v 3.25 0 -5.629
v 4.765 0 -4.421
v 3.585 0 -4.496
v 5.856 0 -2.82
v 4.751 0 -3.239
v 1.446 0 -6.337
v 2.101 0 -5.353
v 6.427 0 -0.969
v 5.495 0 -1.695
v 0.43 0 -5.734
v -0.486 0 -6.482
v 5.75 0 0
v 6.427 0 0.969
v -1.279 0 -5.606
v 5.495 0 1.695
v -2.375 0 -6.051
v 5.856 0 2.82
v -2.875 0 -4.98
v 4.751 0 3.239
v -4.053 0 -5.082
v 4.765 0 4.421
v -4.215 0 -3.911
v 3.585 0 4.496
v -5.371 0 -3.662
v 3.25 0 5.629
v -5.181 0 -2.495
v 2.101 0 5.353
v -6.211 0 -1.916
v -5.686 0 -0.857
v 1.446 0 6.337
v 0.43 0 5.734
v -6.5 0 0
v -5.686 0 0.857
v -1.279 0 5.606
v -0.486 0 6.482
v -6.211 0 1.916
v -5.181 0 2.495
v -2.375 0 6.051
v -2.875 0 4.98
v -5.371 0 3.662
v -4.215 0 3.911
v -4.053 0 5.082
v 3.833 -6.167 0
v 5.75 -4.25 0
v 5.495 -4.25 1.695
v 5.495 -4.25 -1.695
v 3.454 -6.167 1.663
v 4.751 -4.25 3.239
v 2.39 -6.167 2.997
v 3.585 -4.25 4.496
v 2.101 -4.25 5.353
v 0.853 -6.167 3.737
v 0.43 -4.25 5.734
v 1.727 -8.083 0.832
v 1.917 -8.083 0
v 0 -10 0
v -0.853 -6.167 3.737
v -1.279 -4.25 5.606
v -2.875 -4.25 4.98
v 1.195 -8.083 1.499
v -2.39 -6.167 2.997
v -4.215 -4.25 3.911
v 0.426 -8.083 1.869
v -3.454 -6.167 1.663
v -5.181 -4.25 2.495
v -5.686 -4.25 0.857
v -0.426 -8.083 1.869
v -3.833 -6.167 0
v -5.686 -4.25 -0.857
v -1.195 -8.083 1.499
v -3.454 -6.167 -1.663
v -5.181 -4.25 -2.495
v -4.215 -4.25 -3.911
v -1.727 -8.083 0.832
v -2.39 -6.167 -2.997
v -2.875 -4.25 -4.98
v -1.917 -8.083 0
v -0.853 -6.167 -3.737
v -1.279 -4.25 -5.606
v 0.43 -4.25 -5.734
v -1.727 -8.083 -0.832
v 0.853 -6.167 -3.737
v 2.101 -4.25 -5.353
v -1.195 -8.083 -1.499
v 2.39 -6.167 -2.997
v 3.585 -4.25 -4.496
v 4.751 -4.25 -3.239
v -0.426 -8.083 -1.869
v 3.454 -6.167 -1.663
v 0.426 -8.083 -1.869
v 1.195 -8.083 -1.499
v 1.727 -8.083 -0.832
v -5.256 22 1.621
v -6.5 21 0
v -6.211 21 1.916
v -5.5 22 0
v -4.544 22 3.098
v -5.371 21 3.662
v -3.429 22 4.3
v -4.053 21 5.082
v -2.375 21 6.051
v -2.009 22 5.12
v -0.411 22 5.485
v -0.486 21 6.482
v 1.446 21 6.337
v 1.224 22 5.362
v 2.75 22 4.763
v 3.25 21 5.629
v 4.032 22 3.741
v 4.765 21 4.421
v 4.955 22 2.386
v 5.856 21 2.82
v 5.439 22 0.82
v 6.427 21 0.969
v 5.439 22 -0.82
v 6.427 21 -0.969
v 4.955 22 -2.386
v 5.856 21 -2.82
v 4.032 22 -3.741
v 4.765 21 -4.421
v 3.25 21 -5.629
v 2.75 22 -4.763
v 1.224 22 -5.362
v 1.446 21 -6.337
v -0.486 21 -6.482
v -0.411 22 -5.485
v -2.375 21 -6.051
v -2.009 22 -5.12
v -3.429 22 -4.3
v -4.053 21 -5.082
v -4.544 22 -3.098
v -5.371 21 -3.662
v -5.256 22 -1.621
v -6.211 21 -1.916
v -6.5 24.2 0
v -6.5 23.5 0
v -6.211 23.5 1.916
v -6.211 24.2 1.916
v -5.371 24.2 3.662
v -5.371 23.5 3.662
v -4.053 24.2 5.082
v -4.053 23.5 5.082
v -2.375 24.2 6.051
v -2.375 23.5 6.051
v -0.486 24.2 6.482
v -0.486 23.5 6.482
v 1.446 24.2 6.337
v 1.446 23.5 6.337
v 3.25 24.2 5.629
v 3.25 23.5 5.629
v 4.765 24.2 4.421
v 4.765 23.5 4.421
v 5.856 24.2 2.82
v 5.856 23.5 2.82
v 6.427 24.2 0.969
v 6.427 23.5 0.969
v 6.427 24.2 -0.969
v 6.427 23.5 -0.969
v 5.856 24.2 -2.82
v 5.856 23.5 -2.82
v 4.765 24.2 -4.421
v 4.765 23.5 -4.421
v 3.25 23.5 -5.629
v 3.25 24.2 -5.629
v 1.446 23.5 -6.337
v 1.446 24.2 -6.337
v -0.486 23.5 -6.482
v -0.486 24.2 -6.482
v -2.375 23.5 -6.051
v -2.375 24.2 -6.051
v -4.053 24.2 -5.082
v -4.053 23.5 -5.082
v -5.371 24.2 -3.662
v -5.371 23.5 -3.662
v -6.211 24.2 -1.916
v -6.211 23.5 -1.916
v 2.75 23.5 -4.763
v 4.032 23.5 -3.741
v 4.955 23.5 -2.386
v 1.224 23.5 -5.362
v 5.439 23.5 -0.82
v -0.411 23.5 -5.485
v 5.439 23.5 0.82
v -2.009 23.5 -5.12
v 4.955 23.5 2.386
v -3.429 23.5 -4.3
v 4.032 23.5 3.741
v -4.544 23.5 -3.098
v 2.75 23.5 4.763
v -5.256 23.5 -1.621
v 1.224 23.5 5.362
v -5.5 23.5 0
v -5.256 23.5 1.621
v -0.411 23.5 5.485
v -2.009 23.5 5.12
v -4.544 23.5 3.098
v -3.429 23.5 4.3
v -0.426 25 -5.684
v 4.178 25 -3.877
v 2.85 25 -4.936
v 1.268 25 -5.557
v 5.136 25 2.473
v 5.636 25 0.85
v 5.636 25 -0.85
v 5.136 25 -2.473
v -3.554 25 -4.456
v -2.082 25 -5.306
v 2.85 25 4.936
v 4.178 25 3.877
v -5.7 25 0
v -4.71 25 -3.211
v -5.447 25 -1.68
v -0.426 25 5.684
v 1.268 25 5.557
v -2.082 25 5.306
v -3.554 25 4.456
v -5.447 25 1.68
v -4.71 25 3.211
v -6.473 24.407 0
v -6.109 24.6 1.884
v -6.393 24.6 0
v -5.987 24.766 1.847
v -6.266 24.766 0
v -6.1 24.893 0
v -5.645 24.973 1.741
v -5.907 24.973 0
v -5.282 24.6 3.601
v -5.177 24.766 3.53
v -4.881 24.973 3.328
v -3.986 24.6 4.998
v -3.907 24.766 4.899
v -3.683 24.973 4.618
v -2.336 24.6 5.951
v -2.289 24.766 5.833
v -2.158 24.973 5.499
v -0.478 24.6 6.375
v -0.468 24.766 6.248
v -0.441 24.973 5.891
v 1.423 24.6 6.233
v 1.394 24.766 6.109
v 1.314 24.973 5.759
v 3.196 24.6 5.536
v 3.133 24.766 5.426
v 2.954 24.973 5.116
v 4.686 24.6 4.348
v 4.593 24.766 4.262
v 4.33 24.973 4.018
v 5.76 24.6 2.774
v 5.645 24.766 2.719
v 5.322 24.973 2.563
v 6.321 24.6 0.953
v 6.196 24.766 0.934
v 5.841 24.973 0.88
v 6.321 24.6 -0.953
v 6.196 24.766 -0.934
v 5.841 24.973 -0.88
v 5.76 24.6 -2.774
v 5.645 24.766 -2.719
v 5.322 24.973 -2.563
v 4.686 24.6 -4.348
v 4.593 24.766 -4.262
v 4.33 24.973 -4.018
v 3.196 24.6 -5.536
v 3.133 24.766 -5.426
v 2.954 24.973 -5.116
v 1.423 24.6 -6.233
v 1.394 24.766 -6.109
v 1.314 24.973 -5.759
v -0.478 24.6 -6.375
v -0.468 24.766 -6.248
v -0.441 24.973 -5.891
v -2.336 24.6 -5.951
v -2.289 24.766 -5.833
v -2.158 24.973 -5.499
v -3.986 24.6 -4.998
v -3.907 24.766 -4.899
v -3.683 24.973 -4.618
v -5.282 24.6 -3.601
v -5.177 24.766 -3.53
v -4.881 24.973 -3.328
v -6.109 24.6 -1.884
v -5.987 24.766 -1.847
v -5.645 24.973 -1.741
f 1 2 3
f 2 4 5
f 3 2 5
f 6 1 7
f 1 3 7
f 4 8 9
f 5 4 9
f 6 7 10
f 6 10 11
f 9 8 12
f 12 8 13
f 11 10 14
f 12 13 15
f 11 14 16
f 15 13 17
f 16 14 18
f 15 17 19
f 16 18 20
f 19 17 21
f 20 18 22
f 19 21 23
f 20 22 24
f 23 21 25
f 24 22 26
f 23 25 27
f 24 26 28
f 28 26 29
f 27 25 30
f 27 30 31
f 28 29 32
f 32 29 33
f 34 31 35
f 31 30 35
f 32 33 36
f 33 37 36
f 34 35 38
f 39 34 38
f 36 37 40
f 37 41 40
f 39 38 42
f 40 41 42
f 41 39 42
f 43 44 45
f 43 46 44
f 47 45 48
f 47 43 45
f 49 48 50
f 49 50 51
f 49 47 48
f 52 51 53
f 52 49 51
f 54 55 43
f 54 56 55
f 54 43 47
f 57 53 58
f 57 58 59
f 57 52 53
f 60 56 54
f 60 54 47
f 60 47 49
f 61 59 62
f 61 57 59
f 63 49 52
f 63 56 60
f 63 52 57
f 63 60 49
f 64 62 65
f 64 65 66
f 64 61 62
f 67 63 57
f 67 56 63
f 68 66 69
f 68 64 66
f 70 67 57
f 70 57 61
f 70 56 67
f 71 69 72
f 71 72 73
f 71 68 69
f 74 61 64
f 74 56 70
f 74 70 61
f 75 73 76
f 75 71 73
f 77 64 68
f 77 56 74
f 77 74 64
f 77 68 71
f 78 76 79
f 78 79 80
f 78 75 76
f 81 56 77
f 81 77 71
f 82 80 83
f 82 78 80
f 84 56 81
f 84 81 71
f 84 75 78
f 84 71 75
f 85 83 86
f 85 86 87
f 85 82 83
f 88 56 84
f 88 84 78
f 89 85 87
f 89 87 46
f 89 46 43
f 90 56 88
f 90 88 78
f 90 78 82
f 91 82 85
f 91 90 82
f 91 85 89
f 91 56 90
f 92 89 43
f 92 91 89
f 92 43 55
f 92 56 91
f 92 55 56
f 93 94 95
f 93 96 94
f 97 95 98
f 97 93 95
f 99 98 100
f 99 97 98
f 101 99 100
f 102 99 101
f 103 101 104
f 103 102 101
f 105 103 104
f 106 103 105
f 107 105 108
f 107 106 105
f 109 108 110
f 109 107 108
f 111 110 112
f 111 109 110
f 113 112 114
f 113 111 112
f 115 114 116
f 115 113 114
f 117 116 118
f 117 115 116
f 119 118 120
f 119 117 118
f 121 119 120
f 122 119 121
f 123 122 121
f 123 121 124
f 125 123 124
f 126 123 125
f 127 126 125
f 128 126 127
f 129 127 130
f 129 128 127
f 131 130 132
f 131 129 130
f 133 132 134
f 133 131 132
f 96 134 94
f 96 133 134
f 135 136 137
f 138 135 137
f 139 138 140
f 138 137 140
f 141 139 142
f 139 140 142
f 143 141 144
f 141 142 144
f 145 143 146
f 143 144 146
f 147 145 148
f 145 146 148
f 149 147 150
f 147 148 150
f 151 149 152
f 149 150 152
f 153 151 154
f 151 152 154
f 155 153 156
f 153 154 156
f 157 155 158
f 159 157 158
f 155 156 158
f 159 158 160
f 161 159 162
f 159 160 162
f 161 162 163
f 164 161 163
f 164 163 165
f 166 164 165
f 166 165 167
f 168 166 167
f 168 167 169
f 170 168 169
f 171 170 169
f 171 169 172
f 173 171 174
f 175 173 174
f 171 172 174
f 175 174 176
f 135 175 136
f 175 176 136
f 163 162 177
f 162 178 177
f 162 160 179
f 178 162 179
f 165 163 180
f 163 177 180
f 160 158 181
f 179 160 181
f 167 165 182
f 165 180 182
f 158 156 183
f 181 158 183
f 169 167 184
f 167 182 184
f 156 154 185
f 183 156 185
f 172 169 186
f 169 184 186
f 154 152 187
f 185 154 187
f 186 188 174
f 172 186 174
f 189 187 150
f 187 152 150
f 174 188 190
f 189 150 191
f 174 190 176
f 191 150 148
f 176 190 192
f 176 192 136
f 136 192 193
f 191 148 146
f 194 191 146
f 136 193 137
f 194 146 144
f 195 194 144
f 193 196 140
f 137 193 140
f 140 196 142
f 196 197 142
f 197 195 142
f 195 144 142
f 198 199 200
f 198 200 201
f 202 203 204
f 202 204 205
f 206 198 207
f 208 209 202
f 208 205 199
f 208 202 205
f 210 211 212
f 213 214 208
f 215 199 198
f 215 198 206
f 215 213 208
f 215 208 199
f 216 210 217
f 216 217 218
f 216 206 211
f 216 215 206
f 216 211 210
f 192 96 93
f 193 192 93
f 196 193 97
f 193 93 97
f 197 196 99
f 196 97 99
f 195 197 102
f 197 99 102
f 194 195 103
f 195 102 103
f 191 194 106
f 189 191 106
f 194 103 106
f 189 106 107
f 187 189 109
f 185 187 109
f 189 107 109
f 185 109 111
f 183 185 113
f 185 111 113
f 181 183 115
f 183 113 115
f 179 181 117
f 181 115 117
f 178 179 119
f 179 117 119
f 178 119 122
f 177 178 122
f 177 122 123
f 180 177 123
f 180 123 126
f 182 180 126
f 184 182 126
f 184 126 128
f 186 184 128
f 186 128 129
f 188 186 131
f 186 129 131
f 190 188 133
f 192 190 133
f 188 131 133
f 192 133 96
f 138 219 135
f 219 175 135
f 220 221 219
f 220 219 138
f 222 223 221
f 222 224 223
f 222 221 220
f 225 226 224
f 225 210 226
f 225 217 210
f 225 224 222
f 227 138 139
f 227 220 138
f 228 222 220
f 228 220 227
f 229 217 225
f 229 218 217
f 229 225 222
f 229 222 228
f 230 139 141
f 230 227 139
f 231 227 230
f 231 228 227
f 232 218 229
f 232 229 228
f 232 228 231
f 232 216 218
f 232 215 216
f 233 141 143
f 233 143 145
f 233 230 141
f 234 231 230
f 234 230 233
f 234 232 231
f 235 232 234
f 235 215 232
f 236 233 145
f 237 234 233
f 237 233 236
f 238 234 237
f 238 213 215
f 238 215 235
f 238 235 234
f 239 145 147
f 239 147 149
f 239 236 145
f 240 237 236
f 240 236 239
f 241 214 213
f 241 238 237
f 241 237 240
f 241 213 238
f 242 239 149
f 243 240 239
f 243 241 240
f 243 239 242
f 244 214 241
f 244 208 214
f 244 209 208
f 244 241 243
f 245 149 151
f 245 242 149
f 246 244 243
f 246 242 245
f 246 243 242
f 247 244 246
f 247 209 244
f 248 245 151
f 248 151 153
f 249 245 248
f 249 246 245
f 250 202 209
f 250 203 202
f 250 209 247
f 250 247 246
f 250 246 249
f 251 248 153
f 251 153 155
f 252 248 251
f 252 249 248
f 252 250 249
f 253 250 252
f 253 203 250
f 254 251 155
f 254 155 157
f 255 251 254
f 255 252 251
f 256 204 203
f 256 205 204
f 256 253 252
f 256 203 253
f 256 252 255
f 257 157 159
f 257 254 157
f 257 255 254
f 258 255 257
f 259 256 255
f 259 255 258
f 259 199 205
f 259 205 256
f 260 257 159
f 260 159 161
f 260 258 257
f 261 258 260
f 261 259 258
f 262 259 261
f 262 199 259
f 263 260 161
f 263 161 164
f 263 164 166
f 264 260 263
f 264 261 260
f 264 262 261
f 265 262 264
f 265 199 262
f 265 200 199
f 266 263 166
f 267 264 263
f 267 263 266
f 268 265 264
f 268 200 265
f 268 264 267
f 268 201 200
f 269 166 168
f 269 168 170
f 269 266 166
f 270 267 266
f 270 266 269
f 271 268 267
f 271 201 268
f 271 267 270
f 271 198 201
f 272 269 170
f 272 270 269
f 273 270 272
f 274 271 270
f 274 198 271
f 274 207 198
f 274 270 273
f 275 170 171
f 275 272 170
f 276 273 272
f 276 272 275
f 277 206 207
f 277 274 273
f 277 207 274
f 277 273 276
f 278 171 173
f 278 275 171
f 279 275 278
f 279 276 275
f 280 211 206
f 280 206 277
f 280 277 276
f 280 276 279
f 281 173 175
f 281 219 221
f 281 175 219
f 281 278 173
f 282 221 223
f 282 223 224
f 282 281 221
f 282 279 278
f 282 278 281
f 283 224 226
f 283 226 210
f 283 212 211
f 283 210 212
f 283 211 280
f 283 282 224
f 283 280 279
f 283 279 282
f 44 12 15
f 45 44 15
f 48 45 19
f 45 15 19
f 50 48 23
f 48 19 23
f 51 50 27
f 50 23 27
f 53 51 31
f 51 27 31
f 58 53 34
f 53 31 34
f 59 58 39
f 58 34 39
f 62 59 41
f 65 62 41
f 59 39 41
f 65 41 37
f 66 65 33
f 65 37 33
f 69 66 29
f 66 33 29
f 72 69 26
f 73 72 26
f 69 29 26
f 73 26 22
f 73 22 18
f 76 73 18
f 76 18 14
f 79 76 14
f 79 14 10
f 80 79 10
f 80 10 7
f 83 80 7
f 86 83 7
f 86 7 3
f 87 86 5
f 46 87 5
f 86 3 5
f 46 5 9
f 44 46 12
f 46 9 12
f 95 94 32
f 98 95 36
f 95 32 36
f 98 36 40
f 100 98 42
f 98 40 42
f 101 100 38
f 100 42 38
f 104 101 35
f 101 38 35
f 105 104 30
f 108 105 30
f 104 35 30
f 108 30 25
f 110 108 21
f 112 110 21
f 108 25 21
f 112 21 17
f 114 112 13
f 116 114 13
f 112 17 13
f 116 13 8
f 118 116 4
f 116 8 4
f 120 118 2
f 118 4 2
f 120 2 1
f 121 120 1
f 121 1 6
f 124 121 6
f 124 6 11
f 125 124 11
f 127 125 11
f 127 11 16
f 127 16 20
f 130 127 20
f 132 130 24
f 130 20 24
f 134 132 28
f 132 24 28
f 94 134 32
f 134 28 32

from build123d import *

# Parameters (mm, degrees)
F0_R     = 5.75
F1_DEPTH = 10
F2_SIZE  = 5.75
F3_R     = 6.5
F4_DEPTH = 22
F5_SIZE  = 1
F6_R     = 5.5
F7_DEPTH = 1.5
F8_R     = 6.5
F9_DEPTH = 1.5
F10_R    = 0.8


with BuildPart() as f1:
    # F0 (on Front) → F1 (new body)
    with BuildSketch(Plane.XZ):
        Circle(F0_R)
    extrude(amount=F1_DEPTH)

    # F2
    f2_edges = [f1.edges().sort_by_distance(p)[0] for p in [
        (-5.75, -10, 0),
    ]]
    chamfer(f2_edges, length=F2_SIZE)

    # F3 (on face) → F4 (join)
    with BuildSketch(Plane(origin=(0, 0, 0), x_dir=(-1, 0, 0), z_dir=(0, 1, 0))):
        Circle(F3_R)
    extrude(amount=F4_DEPTH)

    # F5
    f5_edges = [f1.edges().sort_by_distance(p)[0] for p in [
        (6.5, 22, 0),
    ]]
    chamfer(f5_edges, length=F5_SIZE)

    # F6 (on face) → F7 (join)
    with BuildSketch(Plane(origin=(0, 22, 0), x_dir=(-1, 0, 0), z_dir=(0, 1, 0))):
        Circle(F6_R)
    extrude(amount=F7_DEPTH)

    # F8 (on face) → F9 (join)
    with BuildSketch(Plane(origin=(0, 23.5, 0), x_dir=(-1, 0, 0), z_dir=(0, 1, 0))):
        Circle(F8_R)
    extrude(amount=F9_DEPTH)

    # F10
    f10_edges = [f1.edges().sort_by_distance(p)[0] for p in [
        (6.5, 25, 0),
    ]]
    fillet(f10_edges, radius=F10_R)


solid = f1.part
